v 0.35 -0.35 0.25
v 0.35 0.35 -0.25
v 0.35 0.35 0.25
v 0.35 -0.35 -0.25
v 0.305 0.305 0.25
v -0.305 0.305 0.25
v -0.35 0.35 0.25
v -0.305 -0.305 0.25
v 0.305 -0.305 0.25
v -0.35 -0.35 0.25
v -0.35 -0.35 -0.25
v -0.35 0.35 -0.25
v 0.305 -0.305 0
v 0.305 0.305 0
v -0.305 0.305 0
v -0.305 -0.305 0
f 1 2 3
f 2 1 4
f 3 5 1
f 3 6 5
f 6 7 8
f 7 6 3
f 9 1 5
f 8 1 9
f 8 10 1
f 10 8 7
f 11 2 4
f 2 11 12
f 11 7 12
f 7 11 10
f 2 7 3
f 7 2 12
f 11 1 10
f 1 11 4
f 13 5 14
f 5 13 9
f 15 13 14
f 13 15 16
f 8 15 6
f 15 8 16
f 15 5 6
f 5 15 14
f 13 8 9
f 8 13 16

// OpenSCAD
use <lib.scad>

module frame() {
	difference() {
		box([0.7,0.7,0.5]);
		translate([0,0,0.25]) box([0.61,0.61,0.5]);
	}
}

hd = 72;
ld = 12;

d = hd;

frame($fn=d);
